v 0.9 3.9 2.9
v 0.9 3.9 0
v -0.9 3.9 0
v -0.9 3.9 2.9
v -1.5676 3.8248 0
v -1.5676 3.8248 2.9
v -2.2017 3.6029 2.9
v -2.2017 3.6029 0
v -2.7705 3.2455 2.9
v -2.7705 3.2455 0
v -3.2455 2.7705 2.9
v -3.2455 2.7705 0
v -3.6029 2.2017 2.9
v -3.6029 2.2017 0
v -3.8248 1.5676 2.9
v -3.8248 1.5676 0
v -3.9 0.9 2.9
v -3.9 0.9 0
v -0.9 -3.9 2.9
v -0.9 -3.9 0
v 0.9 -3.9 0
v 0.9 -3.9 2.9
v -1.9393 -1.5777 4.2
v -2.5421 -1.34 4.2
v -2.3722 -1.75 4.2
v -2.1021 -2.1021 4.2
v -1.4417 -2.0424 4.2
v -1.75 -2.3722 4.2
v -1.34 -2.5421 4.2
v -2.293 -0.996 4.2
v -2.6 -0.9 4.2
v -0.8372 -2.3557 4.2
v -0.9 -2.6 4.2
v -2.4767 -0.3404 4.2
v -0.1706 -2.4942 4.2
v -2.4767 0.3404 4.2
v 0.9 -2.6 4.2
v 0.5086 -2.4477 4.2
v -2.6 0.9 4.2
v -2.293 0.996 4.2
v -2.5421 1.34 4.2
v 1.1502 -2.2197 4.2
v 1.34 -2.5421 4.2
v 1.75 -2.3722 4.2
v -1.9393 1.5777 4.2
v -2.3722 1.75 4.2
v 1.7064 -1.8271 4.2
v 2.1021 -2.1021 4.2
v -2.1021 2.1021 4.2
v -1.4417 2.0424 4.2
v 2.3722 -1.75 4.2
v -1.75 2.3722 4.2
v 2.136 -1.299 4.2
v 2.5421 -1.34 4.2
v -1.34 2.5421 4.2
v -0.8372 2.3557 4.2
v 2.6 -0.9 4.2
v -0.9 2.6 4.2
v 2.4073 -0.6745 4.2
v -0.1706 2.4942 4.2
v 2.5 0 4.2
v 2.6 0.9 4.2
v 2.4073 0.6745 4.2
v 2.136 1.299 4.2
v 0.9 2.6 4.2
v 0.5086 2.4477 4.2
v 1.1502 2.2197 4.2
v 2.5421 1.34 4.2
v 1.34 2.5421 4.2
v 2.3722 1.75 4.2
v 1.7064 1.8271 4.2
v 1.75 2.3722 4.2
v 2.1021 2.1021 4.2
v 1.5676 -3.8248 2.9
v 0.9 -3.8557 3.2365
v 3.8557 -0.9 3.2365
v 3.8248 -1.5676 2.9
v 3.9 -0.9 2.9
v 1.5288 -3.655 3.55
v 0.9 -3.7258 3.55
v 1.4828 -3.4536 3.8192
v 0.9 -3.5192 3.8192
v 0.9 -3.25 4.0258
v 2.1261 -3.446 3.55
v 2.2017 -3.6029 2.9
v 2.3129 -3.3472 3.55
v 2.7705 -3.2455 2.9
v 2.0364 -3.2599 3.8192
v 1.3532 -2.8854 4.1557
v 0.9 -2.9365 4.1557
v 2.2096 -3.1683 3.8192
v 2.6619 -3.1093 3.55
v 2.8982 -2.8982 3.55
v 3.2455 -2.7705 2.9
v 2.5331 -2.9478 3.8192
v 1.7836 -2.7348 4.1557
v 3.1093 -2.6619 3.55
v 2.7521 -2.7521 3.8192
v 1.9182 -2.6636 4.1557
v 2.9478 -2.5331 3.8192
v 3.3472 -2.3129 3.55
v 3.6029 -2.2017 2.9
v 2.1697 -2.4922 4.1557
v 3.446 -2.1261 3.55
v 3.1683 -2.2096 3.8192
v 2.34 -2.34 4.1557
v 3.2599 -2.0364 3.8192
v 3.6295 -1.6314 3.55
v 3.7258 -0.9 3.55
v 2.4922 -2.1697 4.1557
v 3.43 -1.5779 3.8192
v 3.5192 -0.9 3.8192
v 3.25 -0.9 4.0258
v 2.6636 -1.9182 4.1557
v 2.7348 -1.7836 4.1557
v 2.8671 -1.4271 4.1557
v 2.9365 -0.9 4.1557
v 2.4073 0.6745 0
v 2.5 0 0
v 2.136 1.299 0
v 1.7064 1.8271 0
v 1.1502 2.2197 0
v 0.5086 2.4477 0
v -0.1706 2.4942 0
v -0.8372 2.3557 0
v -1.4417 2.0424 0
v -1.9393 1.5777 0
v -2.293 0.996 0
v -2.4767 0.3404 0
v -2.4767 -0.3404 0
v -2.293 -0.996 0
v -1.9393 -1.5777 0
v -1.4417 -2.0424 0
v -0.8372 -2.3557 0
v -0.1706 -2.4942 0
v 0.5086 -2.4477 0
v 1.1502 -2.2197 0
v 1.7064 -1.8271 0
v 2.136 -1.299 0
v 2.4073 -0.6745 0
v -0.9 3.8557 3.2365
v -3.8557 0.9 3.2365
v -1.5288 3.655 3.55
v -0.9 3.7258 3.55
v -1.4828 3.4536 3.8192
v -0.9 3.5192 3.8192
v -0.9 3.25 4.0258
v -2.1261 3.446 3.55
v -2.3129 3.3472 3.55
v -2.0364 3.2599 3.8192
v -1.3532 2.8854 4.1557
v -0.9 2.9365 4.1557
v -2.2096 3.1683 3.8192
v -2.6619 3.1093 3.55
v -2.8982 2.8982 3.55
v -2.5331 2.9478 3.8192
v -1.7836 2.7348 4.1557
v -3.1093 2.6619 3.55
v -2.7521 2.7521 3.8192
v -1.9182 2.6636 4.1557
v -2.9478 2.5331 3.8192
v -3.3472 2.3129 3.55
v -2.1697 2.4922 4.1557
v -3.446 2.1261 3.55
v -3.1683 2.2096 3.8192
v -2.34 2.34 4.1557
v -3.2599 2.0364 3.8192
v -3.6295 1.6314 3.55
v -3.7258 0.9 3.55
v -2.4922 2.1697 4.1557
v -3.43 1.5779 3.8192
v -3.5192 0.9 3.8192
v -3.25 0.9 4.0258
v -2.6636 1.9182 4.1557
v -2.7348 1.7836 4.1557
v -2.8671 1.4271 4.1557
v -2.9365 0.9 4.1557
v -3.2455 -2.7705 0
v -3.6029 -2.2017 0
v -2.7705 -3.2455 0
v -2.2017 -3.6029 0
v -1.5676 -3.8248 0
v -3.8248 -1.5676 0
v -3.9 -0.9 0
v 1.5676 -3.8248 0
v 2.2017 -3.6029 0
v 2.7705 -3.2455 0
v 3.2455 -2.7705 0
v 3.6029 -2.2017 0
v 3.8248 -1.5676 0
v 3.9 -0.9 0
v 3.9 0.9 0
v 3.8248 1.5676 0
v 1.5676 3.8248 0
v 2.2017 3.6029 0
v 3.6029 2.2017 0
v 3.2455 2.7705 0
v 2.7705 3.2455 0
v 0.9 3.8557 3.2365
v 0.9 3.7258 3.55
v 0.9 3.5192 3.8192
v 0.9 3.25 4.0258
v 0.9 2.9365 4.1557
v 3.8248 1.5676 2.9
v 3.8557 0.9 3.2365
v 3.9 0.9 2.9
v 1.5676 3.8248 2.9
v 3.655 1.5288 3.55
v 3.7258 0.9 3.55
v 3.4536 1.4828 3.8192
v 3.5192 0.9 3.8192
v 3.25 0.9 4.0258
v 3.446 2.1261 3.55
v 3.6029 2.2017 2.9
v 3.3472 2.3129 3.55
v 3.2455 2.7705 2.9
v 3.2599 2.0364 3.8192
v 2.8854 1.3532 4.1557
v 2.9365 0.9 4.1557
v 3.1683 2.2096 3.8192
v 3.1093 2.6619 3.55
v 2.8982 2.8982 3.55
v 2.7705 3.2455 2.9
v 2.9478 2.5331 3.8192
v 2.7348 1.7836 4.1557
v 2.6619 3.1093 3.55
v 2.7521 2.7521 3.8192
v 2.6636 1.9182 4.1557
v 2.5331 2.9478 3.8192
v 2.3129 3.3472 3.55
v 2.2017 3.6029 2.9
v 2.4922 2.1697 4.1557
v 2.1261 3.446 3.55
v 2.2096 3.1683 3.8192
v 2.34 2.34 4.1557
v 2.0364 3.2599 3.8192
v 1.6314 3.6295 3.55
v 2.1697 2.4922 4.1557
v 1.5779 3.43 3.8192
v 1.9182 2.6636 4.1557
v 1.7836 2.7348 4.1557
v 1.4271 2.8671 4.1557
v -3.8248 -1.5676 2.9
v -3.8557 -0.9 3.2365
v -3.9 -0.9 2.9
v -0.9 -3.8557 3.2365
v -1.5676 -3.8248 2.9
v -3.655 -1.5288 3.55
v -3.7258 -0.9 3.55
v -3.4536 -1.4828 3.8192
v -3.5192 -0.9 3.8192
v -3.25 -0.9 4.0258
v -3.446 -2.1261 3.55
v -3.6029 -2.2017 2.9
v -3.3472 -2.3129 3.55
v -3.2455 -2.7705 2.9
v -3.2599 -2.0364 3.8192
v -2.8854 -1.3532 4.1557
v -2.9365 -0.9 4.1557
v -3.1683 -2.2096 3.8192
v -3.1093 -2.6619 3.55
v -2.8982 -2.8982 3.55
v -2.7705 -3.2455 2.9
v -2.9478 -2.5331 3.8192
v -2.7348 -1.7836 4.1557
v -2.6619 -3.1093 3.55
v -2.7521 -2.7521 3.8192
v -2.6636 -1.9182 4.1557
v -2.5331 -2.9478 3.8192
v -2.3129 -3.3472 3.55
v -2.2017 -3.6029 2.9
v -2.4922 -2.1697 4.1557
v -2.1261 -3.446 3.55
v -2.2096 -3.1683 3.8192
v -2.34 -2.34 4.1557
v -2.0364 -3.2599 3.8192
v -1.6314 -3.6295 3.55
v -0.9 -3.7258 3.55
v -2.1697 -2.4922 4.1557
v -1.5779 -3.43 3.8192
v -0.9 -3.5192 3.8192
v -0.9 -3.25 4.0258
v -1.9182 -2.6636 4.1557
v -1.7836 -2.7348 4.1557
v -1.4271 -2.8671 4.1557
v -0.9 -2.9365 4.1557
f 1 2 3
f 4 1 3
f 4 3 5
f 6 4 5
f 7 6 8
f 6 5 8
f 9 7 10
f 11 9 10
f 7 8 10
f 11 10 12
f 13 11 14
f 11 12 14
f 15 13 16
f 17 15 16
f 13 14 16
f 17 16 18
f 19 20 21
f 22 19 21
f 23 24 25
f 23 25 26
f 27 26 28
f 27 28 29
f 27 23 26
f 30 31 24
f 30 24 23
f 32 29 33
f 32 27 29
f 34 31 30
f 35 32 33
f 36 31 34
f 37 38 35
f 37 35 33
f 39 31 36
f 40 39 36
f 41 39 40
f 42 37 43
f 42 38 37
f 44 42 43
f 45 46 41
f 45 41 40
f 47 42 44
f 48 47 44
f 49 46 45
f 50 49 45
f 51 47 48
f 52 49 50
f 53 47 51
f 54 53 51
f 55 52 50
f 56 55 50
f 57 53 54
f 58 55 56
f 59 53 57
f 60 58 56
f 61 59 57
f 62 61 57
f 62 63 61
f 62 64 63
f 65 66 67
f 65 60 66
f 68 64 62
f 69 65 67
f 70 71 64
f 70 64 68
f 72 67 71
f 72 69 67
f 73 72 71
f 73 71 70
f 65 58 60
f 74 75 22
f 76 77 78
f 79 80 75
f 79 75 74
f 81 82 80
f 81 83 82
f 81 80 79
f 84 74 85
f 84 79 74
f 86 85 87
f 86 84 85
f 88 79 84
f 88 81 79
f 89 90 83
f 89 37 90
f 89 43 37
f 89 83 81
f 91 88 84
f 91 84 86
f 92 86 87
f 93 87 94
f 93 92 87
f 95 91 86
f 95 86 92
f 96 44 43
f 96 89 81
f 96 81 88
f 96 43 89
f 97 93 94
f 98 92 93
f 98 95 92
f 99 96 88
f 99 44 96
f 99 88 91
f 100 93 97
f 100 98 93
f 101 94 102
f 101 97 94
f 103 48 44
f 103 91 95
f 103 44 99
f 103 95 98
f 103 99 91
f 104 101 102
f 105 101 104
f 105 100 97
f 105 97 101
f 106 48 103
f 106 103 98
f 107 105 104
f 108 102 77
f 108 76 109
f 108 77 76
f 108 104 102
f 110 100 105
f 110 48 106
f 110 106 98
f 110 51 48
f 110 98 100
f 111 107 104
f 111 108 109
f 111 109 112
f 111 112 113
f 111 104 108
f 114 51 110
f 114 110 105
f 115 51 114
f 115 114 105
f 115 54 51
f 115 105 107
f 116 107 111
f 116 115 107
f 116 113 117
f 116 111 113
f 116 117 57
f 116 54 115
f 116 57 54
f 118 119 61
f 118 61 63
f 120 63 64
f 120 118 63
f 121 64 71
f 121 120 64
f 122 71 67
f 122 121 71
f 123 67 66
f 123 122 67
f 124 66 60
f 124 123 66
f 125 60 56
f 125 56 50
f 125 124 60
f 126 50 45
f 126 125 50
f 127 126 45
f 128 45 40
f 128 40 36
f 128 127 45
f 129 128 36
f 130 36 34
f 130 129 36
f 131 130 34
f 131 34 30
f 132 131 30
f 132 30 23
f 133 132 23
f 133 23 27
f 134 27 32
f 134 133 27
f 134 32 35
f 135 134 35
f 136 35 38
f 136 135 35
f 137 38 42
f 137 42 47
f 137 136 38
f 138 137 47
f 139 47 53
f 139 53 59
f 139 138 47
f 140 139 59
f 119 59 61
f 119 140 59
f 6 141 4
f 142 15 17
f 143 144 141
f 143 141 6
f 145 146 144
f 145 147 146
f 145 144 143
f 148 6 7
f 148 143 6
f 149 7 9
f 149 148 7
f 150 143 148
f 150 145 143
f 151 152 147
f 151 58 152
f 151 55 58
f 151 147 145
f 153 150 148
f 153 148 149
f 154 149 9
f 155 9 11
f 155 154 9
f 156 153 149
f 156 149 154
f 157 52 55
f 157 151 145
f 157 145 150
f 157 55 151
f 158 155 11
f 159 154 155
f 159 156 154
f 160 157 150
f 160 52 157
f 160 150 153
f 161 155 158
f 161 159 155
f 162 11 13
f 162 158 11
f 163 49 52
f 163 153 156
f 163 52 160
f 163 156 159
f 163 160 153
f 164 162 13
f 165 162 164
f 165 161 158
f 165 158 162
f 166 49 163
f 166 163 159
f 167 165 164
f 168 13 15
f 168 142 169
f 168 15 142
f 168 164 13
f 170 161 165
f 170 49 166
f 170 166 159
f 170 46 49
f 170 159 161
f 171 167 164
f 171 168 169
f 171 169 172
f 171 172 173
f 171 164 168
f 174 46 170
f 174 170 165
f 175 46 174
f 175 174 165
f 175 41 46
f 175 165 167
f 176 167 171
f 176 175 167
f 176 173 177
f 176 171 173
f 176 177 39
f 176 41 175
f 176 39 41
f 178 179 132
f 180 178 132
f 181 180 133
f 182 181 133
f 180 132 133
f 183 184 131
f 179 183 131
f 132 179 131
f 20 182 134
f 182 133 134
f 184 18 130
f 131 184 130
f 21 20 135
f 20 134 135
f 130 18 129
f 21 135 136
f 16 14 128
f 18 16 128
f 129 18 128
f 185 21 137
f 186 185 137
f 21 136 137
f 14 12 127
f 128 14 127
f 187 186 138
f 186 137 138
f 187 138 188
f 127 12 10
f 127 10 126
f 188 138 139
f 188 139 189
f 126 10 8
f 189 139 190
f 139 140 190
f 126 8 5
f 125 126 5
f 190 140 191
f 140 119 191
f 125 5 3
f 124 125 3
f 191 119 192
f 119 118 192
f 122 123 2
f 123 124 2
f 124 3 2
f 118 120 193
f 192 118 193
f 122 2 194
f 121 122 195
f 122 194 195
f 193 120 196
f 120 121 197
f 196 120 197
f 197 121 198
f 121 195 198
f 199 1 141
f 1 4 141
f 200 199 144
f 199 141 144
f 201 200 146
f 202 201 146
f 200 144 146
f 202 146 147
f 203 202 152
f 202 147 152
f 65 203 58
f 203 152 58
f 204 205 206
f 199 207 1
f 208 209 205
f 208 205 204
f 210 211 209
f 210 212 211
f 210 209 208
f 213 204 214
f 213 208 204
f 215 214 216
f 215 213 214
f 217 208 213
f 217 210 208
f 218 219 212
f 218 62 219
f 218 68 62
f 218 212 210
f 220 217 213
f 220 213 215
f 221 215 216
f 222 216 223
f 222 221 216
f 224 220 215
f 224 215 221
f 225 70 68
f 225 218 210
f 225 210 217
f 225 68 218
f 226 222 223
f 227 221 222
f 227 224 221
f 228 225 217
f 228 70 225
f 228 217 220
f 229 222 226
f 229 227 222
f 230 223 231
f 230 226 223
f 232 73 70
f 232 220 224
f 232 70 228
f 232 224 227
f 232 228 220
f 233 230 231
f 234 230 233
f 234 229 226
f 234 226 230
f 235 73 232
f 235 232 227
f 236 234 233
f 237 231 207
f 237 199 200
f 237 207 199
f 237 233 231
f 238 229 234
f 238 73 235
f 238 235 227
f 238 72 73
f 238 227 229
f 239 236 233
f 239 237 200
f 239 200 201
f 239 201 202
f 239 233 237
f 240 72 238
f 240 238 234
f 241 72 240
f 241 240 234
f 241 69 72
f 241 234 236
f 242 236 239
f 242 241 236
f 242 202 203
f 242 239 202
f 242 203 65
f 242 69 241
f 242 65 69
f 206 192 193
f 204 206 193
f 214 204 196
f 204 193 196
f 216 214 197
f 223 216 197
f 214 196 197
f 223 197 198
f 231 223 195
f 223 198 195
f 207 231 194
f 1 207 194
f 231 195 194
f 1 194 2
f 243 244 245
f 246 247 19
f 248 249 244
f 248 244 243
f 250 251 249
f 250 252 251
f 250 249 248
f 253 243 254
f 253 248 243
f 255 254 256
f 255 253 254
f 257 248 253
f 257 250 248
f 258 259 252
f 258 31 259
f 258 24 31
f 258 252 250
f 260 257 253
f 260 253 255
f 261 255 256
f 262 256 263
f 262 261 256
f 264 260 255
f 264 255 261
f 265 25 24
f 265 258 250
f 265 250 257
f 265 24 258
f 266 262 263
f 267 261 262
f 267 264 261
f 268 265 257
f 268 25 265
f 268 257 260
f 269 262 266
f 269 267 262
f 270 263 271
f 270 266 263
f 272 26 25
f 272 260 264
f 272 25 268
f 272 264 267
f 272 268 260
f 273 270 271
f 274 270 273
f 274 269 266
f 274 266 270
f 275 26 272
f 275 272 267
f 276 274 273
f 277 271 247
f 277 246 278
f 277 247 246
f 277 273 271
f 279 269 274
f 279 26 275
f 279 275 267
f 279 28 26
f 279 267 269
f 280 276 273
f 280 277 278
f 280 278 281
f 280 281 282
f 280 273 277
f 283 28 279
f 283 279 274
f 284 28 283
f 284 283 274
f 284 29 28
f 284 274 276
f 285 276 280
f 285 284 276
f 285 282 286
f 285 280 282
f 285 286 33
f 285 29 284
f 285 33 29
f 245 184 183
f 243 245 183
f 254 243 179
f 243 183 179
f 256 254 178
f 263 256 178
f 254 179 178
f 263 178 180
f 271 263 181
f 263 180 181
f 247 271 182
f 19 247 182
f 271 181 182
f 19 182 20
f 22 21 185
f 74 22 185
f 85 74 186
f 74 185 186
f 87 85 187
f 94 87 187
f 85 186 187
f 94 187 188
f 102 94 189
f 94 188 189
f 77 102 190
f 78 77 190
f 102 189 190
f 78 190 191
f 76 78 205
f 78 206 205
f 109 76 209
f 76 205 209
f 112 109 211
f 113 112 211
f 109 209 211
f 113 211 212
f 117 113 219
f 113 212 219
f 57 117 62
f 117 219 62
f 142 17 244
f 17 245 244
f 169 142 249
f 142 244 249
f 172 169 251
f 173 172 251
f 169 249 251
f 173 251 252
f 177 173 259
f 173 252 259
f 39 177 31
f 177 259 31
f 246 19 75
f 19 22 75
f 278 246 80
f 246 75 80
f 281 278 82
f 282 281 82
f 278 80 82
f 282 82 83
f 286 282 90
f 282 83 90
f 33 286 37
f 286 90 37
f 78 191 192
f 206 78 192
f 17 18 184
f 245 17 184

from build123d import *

# Parameters (mm, degrees)
SKETCH_R  = 2.5
PAD_DEPTH = 4.2
FILLET_R  = 1.3


with BuildPart() as part:
    # Sketch → Pad (new body)
    with BuildSketch(Plane.XY):
        with BuildLine():
            Line((-3.9, 0.9), (-3.9, -0.9))
            ThreePointArc((-3.9, -0.9), (-3.02132, -3.02132), (-0.9, -3.9))
            Line((-0.9, -3.9), (0.9, -3.9))
            ThreePointArc((0.9, -3.9), (3.02132, -3.02132), (3.9, -0.9))
            Line((3.9, -0.9), (3.9, 0.9))
            ThreePointArc((3.9, 0.9), (3.02132, 3.02132), (0.9, 3.9))
            Line((0.9, 3.9), (-0.9, 3.9))
            ThreePointArc((-0.9, 3.9), (-3.02132, 3.02132), (-3.9, 0.9))
        make_face()
        Circle(SKETCH_R, mode=Mode.SUBTRACT)
    extrude(amount=PAD_DEPTH)

    # Fillet
    fillet_edges = [part.edges().sort_by_distance(p)[0] for p in [
        (3.9, 0, 4.2),
    ]]
    fillet(fillet_edges, radius=FILLET_R)


solid = part.part
